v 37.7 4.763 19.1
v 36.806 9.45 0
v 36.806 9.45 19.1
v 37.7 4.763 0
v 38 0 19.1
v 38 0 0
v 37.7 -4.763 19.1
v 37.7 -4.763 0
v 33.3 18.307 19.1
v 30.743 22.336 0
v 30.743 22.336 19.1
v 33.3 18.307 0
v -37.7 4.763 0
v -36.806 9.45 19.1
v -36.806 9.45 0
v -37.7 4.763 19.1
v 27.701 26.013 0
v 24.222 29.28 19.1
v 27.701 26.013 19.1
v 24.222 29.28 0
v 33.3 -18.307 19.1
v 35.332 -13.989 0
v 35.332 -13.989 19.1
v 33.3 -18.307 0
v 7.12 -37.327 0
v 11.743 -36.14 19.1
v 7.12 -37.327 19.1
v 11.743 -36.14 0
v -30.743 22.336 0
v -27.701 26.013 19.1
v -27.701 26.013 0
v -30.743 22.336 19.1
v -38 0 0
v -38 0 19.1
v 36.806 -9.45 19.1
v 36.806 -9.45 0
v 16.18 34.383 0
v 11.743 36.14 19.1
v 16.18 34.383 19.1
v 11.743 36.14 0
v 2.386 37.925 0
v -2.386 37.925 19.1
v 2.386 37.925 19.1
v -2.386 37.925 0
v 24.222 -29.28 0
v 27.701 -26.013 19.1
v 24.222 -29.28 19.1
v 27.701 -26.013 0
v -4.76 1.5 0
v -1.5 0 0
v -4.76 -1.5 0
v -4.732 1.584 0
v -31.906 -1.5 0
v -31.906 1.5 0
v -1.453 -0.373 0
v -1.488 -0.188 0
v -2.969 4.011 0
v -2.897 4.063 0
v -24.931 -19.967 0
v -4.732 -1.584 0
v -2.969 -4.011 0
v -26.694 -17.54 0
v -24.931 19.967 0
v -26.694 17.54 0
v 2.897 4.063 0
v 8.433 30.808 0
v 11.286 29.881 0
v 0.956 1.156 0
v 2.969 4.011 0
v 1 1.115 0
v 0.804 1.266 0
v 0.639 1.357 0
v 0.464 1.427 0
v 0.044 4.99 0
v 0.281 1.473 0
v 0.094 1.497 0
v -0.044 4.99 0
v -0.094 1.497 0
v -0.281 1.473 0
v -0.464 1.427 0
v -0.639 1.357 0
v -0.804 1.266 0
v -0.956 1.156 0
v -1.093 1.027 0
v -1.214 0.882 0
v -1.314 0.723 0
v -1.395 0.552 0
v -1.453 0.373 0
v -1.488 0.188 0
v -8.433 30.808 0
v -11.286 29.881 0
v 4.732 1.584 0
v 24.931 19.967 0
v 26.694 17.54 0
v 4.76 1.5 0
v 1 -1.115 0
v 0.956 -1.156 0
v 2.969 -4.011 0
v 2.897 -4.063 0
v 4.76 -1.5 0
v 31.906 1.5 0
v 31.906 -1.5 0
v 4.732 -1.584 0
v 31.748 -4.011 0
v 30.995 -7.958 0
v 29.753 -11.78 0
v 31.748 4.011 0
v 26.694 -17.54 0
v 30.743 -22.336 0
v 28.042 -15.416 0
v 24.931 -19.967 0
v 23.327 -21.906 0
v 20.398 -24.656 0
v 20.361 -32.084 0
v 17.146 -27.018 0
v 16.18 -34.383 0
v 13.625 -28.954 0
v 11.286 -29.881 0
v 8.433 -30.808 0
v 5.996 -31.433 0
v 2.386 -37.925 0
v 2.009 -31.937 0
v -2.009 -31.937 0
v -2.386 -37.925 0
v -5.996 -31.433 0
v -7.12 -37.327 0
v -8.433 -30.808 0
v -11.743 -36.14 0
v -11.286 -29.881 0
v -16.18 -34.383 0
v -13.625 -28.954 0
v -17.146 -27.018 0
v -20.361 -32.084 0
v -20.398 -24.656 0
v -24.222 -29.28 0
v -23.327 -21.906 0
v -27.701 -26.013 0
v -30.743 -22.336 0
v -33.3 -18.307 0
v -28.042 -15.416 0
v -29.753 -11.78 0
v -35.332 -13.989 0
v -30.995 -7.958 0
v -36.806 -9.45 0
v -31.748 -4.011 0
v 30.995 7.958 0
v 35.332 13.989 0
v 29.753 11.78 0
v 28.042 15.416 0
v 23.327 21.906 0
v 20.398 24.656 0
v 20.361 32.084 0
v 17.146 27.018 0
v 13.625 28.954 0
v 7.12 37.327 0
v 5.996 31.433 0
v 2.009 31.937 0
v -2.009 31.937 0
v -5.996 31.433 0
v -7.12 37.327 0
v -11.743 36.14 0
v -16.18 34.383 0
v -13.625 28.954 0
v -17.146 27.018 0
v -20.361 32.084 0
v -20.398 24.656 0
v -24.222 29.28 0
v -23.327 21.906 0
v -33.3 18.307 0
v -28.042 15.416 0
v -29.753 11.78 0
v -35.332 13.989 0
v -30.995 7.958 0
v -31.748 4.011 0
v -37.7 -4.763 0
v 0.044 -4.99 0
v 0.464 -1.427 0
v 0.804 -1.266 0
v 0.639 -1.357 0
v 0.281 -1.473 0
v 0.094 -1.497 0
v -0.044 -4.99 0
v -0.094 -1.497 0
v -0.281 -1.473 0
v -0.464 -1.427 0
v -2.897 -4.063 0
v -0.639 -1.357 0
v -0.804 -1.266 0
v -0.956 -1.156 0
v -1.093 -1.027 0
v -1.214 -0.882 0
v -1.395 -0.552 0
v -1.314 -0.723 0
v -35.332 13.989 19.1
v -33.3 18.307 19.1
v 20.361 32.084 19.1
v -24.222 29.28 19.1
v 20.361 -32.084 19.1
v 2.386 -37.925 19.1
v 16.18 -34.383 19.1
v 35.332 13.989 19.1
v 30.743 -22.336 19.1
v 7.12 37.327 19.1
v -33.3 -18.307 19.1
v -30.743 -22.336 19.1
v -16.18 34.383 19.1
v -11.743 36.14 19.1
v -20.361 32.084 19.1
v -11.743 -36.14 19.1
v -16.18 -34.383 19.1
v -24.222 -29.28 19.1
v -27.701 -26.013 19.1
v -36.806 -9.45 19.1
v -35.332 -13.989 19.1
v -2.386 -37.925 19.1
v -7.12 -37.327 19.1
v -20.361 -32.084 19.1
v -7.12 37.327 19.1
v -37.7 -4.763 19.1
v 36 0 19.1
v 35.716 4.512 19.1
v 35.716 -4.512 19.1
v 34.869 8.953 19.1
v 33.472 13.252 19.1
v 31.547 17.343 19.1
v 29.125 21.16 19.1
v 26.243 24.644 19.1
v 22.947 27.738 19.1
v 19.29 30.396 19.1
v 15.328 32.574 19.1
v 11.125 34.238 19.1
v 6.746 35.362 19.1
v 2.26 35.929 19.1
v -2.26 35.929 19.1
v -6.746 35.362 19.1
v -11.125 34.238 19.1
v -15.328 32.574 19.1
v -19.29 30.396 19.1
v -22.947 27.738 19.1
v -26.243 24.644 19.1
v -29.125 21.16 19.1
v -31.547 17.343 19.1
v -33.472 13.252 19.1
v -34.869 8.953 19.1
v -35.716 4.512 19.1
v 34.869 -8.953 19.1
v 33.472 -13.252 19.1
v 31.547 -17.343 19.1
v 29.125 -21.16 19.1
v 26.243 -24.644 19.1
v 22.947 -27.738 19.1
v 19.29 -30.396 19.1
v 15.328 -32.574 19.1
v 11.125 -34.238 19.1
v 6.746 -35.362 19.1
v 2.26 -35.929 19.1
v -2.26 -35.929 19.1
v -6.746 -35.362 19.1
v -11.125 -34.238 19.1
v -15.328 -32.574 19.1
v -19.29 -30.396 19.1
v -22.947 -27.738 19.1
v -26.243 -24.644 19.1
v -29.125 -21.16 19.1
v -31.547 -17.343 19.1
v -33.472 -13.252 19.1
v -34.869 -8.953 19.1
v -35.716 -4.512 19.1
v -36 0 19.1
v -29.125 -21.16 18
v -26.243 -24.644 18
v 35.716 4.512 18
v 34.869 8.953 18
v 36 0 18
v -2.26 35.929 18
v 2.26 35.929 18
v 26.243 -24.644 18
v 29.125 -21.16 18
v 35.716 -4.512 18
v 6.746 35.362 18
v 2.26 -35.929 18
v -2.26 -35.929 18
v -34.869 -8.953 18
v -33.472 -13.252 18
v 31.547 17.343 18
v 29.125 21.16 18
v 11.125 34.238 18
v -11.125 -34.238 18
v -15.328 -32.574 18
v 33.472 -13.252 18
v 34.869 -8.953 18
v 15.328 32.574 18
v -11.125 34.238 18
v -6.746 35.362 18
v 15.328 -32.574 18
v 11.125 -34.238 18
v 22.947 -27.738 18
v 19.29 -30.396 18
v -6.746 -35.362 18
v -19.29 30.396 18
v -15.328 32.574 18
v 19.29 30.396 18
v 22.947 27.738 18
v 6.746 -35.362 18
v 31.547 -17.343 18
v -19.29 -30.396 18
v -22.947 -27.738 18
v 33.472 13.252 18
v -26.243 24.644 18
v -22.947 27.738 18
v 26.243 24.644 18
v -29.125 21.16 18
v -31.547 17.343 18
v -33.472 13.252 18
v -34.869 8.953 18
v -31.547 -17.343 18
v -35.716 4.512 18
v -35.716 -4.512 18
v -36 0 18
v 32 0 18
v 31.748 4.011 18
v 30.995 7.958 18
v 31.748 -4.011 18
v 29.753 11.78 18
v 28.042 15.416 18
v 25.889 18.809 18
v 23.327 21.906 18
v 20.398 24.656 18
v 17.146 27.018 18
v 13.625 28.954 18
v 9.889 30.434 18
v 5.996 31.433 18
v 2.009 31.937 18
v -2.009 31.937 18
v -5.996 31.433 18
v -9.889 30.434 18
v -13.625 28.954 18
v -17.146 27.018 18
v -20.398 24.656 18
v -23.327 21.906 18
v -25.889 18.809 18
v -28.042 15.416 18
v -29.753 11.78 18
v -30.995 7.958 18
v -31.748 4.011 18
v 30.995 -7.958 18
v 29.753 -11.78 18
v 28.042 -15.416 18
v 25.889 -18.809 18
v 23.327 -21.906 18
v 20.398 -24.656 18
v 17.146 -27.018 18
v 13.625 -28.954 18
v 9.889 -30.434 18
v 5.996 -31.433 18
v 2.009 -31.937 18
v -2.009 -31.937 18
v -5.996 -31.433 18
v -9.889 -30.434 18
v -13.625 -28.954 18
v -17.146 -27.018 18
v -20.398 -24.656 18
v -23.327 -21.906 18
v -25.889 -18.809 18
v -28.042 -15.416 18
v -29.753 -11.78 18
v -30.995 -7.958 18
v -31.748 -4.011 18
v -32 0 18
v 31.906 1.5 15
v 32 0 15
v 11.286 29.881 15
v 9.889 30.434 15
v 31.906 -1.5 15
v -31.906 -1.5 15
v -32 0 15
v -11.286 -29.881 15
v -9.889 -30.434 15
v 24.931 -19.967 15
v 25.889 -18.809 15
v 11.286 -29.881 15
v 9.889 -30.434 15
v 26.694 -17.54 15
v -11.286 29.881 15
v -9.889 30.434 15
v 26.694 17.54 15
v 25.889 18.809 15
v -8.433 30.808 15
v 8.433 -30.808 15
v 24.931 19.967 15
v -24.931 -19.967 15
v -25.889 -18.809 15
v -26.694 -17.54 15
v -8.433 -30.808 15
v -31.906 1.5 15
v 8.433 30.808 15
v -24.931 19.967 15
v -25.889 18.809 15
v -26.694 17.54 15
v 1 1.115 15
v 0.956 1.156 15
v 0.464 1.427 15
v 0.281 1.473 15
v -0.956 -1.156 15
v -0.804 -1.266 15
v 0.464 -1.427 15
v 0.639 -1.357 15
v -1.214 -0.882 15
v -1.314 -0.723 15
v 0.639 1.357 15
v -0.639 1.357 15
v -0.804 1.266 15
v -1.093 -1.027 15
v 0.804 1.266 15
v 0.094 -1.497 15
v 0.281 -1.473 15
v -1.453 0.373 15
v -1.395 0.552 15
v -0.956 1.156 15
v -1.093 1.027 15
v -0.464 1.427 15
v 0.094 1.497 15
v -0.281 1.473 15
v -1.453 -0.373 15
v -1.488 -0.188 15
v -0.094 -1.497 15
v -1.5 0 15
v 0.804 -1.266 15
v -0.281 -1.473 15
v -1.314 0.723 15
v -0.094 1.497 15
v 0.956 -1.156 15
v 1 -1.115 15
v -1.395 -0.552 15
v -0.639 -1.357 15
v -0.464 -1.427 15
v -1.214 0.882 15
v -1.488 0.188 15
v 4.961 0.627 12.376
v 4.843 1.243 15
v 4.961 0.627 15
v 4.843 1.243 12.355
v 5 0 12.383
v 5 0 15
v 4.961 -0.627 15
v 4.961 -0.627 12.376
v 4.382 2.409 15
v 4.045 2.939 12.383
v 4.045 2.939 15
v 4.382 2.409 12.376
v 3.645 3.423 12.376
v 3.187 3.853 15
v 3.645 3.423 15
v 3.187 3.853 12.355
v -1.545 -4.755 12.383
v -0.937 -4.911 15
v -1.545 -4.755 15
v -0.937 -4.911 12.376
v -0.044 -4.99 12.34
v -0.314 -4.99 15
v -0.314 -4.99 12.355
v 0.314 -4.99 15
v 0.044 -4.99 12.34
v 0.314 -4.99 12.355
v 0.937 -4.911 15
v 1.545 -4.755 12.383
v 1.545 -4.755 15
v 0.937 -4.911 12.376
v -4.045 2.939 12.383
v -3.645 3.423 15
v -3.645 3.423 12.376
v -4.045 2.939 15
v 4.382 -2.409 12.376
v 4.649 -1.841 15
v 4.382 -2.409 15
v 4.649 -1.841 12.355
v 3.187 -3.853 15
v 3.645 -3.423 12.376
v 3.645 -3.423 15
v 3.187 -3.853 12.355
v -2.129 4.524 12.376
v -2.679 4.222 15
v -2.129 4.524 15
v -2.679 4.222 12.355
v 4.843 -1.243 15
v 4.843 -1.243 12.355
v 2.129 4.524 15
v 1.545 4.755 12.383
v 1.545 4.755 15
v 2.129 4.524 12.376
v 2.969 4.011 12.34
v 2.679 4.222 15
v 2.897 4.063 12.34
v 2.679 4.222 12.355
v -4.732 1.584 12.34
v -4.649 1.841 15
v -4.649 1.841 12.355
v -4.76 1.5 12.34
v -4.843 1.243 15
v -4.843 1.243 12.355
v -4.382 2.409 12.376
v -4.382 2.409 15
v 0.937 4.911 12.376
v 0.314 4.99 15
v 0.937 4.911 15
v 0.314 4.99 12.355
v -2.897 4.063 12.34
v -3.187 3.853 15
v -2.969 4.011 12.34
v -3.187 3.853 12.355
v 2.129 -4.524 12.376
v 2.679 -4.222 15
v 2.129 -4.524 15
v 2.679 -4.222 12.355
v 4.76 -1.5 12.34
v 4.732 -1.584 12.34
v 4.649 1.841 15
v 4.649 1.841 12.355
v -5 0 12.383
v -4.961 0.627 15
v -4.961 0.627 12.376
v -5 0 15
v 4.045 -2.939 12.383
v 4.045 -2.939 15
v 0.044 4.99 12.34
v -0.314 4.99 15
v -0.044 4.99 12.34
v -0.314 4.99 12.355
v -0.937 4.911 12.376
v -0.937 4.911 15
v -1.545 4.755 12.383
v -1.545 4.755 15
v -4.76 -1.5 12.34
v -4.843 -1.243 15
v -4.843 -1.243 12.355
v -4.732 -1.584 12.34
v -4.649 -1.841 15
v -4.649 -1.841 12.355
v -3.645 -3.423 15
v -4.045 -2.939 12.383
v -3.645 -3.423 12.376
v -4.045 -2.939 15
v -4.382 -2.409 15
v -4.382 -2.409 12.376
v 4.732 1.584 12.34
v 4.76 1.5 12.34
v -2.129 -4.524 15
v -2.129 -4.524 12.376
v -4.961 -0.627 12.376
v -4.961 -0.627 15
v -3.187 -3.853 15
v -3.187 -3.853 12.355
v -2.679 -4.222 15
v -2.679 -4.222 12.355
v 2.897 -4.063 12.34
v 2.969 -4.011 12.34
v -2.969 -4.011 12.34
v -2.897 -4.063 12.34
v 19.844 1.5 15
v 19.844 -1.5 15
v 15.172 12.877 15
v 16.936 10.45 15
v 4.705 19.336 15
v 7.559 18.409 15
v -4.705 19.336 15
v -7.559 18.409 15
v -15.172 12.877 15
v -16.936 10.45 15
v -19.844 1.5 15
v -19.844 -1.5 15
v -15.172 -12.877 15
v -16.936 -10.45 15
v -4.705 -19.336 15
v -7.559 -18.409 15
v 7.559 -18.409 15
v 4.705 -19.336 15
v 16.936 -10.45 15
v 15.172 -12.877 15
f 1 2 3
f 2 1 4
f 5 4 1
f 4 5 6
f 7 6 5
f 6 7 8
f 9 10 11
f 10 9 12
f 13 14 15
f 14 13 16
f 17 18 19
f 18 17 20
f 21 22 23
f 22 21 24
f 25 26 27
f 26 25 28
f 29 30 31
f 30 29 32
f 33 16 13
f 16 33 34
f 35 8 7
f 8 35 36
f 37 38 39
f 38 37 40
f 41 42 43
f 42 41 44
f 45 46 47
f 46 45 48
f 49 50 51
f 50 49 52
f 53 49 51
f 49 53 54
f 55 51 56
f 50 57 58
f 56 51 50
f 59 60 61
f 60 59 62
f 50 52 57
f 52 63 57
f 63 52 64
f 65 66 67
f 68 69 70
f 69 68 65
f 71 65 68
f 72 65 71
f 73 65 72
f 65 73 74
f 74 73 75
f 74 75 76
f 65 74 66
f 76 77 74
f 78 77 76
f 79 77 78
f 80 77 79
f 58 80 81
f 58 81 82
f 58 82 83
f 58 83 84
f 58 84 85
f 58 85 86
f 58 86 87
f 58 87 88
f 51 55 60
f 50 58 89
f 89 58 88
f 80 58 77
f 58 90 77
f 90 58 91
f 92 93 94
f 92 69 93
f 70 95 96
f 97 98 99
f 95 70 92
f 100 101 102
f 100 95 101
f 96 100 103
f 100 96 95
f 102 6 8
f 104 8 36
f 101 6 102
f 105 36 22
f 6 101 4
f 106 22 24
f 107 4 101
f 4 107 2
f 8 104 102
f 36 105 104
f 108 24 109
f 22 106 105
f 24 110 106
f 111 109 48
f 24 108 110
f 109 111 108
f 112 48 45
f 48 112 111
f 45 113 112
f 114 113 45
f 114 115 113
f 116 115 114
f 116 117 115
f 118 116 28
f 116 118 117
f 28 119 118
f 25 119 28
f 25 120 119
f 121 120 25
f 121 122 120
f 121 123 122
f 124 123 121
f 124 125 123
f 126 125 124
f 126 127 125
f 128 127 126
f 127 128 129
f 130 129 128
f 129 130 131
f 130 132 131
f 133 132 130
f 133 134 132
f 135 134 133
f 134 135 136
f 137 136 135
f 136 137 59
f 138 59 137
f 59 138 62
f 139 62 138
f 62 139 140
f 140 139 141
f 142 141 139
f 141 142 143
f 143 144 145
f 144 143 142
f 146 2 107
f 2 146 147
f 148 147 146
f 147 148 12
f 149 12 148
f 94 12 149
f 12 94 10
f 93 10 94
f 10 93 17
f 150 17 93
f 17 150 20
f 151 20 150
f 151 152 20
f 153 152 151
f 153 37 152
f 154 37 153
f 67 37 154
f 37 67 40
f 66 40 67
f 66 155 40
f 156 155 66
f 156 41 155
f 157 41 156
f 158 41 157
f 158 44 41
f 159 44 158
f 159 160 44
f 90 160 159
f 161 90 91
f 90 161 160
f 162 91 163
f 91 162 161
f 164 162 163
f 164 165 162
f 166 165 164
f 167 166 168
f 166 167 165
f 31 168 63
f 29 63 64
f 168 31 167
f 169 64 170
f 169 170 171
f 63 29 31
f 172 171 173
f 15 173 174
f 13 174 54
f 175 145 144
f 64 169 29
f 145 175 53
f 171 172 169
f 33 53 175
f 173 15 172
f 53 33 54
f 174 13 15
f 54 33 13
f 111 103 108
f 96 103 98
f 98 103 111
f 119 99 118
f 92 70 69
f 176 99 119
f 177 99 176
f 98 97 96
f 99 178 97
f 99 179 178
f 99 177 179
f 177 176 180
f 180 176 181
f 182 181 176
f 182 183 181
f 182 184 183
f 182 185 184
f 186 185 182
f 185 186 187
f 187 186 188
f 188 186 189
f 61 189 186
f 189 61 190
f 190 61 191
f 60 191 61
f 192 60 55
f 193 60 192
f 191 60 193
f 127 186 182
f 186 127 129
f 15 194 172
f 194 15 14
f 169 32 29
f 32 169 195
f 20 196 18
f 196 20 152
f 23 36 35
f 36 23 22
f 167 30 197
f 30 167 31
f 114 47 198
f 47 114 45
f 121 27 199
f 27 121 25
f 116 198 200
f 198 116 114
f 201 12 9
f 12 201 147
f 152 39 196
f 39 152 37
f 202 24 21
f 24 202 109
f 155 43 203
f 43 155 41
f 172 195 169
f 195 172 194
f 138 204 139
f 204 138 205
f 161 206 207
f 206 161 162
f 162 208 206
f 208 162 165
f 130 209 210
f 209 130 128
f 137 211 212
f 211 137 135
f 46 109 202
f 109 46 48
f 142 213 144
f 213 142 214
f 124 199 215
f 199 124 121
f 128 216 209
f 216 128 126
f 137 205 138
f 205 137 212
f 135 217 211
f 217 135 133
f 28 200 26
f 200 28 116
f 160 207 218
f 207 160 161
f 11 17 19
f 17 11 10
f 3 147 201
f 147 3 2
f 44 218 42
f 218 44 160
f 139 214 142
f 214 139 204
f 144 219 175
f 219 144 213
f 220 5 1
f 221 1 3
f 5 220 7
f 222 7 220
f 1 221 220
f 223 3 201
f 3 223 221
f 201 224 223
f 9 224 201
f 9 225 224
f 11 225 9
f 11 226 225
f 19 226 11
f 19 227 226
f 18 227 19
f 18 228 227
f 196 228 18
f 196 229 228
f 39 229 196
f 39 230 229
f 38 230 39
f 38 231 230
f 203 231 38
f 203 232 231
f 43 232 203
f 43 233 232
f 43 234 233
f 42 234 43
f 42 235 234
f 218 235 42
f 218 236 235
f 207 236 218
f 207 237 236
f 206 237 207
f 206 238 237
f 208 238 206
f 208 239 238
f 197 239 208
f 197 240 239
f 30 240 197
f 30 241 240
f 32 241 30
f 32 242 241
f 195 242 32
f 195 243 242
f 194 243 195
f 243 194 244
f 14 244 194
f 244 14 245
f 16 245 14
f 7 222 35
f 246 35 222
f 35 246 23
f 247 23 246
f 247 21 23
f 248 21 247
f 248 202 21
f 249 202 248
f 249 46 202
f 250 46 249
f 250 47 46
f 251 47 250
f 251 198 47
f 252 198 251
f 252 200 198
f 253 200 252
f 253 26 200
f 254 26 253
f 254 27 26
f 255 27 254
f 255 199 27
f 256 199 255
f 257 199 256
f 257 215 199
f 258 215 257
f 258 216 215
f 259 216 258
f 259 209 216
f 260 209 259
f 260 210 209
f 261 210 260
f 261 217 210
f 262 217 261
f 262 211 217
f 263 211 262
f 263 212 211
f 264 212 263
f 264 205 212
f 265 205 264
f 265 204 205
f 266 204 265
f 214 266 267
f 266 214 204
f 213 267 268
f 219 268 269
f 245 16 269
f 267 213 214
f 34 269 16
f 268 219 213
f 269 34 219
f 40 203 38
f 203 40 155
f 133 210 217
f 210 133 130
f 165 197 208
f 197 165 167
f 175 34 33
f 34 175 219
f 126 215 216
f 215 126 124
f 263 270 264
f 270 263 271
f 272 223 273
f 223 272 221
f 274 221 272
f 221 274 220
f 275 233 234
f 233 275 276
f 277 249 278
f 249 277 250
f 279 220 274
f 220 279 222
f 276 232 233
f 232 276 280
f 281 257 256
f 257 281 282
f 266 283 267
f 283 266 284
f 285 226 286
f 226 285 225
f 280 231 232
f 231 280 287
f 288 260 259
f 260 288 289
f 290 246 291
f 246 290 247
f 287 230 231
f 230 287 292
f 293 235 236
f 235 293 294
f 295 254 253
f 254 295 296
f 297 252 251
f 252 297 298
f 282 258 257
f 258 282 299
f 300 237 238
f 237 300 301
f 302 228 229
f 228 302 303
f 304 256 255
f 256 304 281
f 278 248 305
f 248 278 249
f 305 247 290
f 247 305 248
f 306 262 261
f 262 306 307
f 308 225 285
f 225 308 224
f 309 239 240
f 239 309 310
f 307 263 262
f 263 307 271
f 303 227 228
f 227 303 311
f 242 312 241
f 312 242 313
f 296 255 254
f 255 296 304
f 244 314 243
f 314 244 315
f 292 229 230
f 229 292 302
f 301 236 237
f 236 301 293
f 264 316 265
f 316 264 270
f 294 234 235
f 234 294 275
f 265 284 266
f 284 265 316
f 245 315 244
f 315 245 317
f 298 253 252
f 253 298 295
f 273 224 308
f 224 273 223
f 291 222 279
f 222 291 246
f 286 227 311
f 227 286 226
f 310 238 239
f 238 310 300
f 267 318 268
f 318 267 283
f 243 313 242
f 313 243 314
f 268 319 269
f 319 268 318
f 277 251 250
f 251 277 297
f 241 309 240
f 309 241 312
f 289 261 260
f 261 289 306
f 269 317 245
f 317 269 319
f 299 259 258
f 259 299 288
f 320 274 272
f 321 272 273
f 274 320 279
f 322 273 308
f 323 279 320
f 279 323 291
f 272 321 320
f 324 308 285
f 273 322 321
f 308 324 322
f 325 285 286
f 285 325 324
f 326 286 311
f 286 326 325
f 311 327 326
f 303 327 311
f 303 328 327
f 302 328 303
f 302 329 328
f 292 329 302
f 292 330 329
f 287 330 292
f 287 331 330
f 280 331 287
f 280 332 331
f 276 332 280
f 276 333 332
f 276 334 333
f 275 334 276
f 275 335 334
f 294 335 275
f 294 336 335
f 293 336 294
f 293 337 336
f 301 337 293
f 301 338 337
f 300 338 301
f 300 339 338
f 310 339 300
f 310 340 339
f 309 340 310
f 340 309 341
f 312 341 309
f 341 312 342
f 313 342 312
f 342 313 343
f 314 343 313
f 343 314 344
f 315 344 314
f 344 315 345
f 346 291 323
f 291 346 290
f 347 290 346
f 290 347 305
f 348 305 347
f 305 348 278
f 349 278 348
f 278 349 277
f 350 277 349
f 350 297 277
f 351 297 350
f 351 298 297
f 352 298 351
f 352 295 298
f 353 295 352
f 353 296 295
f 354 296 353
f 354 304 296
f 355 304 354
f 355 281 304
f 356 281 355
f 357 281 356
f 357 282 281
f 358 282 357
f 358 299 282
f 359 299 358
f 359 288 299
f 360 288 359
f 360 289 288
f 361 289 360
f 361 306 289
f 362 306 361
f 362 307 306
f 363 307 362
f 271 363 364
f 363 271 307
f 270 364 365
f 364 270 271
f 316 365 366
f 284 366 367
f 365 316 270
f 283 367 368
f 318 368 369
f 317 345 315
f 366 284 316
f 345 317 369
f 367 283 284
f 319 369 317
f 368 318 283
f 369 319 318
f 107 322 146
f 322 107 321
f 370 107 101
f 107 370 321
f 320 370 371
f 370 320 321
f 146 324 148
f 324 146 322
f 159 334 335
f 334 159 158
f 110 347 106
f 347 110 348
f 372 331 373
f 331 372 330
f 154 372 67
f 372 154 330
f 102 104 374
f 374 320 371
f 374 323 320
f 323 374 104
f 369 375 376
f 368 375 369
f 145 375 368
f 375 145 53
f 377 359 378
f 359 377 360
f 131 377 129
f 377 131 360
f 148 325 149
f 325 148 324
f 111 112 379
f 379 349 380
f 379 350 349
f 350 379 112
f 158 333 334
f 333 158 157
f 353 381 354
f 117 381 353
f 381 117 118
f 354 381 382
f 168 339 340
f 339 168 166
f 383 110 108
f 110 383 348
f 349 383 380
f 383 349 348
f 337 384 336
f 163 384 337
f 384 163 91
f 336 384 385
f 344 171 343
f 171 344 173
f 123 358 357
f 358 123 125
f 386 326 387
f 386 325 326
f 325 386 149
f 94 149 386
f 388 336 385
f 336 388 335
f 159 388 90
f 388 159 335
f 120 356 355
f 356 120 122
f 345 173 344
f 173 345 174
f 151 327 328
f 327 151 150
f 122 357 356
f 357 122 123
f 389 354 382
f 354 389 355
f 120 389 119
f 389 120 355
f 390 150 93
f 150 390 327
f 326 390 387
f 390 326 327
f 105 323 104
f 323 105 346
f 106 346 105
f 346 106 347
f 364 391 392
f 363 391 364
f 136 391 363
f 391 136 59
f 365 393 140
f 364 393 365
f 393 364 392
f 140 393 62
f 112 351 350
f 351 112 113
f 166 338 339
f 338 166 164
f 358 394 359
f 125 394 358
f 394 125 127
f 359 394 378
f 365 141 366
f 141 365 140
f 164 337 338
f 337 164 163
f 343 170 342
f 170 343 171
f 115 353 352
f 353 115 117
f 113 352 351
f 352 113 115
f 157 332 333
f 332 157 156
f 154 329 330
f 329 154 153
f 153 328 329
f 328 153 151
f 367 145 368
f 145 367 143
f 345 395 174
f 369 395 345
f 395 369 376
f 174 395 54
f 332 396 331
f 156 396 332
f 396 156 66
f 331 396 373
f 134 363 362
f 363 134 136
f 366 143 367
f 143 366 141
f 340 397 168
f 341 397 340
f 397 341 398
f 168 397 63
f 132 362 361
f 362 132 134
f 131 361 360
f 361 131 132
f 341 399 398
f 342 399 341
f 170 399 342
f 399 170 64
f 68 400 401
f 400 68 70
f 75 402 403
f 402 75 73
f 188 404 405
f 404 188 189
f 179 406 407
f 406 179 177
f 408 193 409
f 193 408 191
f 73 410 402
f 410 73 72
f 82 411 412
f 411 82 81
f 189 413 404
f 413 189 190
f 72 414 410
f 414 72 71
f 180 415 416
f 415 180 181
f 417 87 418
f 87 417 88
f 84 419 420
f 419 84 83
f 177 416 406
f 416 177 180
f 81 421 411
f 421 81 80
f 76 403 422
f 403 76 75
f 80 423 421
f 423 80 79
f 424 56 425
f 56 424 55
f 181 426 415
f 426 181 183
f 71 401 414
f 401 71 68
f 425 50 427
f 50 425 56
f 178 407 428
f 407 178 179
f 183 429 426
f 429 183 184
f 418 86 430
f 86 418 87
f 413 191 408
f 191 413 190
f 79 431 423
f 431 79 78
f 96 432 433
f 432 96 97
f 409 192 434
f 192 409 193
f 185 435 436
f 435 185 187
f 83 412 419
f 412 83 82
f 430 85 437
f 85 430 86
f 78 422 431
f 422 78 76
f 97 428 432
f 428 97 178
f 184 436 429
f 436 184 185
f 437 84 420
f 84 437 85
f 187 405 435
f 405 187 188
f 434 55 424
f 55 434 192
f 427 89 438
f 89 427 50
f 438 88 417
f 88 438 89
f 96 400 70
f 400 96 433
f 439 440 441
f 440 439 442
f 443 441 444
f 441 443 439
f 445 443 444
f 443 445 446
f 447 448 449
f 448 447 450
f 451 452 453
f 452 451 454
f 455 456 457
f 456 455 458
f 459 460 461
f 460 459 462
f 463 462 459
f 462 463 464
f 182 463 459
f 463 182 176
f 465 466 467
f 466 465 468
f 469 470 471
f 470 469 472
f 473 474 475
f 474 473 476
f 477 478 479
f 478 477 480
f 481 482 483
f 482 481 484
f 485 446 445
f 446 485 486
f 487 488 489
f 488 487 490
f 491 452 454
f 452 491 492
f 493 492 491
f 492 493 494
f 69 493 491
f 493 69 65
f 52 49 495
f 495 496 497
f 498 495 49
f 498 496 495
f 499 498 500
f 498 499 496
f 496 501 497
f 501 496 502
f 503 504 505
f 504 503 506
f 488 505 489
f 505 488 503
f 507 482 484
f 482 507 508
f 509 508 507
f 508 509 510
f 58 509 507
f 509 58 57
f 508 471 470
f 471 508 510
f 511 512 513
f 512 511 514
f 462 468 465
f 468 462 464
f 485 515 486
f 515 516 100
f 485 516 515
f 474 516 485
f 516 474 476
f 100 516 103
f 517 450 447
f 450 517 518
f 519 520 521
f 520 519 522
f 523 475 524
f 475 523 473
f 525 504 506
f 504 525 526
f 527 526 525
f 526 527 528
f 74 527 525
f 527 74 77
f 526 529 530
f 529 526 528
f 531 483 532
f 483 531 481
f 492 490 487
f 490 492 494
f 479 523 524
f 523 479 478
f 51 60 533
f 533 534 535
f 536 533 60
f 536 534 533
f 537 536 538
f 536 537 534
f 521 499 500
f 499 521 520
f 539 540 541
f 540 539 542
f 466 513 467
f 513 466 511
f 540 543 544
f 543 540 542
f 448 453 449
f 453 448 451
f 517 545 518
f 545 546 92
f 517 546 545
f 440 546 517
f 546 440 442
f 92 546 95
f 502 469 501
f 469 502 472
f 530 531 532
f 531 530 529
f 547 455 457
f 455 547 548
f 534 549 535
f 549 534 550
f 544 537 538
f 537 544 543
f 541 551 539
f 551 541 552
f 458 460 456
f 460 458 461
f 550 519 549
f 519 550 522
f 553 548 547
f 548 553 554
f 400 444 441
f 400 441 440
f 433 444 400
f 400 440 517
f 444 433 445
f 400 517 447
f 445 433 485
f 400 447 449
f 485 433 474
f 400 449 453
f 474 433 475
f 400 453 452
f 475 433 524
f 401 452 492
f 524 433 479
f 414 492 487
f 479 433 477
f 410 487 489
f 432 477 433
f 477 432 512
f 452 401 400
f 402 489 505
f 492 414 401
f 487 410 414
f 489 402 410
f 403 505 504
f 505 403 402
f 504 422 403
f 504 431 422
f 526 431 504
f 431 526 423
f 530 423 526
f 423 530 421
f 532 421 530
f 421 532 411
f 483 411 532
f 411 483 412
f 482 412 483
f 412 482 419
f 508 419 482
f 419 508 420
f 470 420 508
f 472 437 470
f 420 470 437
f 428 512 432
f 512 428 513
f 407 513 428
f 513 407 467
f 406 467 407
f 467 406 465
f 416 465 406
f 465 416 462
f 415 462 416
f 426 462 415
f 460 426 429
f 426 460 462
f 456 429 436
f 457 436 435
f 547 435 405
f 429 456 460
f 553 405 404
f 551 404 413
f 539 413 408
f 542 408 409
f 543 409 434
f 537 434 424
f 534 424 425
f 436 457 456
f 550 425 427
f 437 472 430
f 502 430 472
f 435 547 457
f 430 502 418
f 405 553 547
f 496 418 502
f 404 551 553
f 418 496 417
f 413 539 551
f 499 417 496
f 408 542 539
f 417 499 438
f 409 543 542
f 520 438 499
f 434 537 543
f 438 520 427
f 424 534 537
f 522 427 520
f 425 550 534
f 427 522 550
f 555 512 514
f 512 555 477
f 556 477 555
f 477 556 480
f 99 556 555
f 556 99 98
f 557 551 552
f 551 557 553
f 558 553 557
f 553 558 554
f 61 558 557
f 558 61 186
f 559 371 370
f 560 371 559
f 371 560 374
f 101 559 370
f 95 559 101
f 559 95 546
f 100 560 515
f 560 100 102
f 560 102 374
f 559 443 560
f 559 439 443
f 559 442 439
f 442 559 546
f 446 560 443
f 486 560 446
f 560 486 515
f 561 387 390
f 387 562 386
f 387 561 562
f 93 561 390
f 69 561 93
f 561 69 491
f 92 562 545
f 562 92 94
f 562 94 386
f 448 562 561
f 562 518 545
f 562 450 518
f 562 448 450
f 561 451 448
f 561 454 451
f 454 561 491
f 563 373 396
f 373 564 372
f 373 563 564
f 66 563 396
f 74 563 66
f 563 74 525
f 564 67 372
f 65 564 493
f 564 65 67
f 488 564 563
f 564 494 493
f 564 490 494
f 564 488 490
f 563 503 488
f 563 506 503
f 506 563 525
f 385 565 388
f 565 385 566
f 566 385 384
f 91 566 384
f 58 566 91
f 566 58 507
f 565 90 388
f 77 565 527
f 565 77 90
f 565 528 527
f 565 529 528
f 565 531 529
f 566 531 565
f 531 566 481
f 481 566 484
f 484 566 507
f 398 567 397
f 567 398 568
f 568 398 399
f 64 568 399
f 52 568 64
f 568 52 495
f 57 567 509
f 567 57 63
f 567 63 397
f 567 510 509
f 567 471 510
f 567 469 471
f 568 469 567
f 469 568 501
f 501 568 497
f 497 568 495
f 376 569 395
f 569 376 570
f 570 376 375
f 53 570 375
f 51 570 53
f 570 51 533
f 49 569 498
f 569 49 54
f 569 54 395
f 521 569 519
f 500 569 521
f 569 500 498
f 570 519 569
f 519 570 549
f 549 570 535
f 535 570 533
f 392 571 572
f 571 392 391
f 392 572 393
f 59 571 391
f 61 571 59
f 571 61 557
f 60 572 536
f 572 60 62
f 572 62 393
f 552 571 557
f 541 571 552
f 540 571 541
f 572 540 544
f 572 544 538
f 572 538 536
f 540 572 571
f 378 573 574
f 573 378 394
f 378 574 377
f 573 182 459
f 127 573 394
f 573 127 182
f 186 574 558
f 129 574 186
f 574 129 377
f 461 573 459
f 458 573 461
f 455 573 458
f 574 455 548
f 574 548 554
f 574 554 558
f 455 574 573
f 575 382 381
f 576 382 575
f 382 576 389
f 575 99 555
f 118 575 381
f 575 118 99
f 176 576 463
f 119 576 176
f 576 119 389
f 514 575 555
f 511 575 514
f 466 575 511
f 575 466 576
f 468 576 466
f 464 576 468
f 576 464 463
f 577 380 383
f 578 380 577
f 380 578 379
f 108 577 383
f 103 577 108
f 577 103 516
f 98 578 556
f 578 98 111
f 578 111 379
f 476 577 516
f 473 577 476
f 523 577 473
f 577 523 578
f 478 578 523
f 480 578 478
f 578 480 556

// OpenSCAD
wheel_width = 19.1;

rim_external_radius = 38;
rim_thickness = 2;

inner_rim_thickness = 4;
inner_rim_height = 18;

hub_height = 15;
hub_radius = 5;

shaft_radius = 1.5;
shaft_flat = true;
shaft_flat_offset=1;

spoke_type = 1; // 1 = parallel 2= wedge
num_spokes = 10;
spoke_thickness = 3;
spoke_height = 15;
spoke_angle = -10;

union(){
// outer rim
difference(){
    cylinder(wheel_width,rim_external_radius,rim_external_radius, $fn=50);  // outer rim
 
    translate([0,0,-1]){     // inner rim
        cylinder(wheel_width+2, rim_external_radius-rim_thickness,rim_external_radius-rim_thickness, $fn=50);
    }
}

// inner rim
difference()
{
    cylinder(inner_rim_height,rim_external_radius-rim_thickness,rim_external_radius-rim_thickness, $fn=50);  // outer rim
 
    translate([0,0,-1]){     // inner rim
        cylinder(wheel_width+2, rim_external_radius-rim_thickness-inner_rim_thickness,rim_external_radius-rim_thickness-inner_rim_thickness, $fn=50);
    }
}

// hub
difference()
{
    cylinder(hub_height,hub_radius,hub_radius, $fn=50);  // outer hub
 
    translate([0,0,-1])
    {   
        // inner hub
        difference()
        {
            cylinder(wheel_width+2,shaft_radius, shaft_radius, $fn=50); 
            //flat on shaft
            if (shaft_flat == true)
            {
                translate([shaft_radius+shaft_flat_offset,0,15])
                {
                    cube([shaft_radius*2
                    ,shaft_radius*2,29], true); //shaft diameter
                }
            }   
        }
    }
}



step_angle = 360/num_spokes;
for (angle = [0: step_angle: 360])
{
    rotate ( angle)
    {
        if (spoke_type == 1) // original
        {
            translate([(rim_external_radius-rim_thickness-hub_radius)/2+hub_radius,0,           spoke_height/2]) 
            {
                difference()
                {
                    cube([rim_external_radius-rim_thickness-hub_radius+1,spoke_thickness,                   spoke_height], true);  // fudge
                    rotate([0,spoke_angle,0])
                    {
                        translate([0,0,spoke_height])
                        {
                            cube([rim_external_radius-rim_thickness-hub_radius+1,spoke_thickness+1,spoke_height], true);  // fudge
                        }
                    }
                }
            }
        }
        else
        { 
            if (spoke_type ==2)  // parallel
            {
                rotate([90,0,0])
                {
        
                    linear_extrude(1.5, center = true)
                    {
                        polygon( [[hub_radius-0.5,0], [rim_external_radius-rim_thickness-                       inner_rim_thickness+0.5,0],
                            [rim_external_radius-rim_thickness-inner_rim_thickness+0.5,                         inner_rim_height],[hub_radius-0.5, hub_height-0.5]]);
                    }
                }
            }
            else
            {
                if (spoke_type ==3) // wedge
                {
                    rotate_extrude(angle = spoke_thickness * 4, $fn=50)
                    {   
                        polygon( [[hub_radius-0.5,0], [rim_external_radius-rim_thickness-                       inner_rim_thickness+0.5,0],
                           [rim_external_radius-rim_thickness-inner_rim_thickness+0.5,                      inner_rim_height],
                            [hub_radius-0.5, hub_height-0.5]]);
                    }
                }
            }
        }
    }
}

}
